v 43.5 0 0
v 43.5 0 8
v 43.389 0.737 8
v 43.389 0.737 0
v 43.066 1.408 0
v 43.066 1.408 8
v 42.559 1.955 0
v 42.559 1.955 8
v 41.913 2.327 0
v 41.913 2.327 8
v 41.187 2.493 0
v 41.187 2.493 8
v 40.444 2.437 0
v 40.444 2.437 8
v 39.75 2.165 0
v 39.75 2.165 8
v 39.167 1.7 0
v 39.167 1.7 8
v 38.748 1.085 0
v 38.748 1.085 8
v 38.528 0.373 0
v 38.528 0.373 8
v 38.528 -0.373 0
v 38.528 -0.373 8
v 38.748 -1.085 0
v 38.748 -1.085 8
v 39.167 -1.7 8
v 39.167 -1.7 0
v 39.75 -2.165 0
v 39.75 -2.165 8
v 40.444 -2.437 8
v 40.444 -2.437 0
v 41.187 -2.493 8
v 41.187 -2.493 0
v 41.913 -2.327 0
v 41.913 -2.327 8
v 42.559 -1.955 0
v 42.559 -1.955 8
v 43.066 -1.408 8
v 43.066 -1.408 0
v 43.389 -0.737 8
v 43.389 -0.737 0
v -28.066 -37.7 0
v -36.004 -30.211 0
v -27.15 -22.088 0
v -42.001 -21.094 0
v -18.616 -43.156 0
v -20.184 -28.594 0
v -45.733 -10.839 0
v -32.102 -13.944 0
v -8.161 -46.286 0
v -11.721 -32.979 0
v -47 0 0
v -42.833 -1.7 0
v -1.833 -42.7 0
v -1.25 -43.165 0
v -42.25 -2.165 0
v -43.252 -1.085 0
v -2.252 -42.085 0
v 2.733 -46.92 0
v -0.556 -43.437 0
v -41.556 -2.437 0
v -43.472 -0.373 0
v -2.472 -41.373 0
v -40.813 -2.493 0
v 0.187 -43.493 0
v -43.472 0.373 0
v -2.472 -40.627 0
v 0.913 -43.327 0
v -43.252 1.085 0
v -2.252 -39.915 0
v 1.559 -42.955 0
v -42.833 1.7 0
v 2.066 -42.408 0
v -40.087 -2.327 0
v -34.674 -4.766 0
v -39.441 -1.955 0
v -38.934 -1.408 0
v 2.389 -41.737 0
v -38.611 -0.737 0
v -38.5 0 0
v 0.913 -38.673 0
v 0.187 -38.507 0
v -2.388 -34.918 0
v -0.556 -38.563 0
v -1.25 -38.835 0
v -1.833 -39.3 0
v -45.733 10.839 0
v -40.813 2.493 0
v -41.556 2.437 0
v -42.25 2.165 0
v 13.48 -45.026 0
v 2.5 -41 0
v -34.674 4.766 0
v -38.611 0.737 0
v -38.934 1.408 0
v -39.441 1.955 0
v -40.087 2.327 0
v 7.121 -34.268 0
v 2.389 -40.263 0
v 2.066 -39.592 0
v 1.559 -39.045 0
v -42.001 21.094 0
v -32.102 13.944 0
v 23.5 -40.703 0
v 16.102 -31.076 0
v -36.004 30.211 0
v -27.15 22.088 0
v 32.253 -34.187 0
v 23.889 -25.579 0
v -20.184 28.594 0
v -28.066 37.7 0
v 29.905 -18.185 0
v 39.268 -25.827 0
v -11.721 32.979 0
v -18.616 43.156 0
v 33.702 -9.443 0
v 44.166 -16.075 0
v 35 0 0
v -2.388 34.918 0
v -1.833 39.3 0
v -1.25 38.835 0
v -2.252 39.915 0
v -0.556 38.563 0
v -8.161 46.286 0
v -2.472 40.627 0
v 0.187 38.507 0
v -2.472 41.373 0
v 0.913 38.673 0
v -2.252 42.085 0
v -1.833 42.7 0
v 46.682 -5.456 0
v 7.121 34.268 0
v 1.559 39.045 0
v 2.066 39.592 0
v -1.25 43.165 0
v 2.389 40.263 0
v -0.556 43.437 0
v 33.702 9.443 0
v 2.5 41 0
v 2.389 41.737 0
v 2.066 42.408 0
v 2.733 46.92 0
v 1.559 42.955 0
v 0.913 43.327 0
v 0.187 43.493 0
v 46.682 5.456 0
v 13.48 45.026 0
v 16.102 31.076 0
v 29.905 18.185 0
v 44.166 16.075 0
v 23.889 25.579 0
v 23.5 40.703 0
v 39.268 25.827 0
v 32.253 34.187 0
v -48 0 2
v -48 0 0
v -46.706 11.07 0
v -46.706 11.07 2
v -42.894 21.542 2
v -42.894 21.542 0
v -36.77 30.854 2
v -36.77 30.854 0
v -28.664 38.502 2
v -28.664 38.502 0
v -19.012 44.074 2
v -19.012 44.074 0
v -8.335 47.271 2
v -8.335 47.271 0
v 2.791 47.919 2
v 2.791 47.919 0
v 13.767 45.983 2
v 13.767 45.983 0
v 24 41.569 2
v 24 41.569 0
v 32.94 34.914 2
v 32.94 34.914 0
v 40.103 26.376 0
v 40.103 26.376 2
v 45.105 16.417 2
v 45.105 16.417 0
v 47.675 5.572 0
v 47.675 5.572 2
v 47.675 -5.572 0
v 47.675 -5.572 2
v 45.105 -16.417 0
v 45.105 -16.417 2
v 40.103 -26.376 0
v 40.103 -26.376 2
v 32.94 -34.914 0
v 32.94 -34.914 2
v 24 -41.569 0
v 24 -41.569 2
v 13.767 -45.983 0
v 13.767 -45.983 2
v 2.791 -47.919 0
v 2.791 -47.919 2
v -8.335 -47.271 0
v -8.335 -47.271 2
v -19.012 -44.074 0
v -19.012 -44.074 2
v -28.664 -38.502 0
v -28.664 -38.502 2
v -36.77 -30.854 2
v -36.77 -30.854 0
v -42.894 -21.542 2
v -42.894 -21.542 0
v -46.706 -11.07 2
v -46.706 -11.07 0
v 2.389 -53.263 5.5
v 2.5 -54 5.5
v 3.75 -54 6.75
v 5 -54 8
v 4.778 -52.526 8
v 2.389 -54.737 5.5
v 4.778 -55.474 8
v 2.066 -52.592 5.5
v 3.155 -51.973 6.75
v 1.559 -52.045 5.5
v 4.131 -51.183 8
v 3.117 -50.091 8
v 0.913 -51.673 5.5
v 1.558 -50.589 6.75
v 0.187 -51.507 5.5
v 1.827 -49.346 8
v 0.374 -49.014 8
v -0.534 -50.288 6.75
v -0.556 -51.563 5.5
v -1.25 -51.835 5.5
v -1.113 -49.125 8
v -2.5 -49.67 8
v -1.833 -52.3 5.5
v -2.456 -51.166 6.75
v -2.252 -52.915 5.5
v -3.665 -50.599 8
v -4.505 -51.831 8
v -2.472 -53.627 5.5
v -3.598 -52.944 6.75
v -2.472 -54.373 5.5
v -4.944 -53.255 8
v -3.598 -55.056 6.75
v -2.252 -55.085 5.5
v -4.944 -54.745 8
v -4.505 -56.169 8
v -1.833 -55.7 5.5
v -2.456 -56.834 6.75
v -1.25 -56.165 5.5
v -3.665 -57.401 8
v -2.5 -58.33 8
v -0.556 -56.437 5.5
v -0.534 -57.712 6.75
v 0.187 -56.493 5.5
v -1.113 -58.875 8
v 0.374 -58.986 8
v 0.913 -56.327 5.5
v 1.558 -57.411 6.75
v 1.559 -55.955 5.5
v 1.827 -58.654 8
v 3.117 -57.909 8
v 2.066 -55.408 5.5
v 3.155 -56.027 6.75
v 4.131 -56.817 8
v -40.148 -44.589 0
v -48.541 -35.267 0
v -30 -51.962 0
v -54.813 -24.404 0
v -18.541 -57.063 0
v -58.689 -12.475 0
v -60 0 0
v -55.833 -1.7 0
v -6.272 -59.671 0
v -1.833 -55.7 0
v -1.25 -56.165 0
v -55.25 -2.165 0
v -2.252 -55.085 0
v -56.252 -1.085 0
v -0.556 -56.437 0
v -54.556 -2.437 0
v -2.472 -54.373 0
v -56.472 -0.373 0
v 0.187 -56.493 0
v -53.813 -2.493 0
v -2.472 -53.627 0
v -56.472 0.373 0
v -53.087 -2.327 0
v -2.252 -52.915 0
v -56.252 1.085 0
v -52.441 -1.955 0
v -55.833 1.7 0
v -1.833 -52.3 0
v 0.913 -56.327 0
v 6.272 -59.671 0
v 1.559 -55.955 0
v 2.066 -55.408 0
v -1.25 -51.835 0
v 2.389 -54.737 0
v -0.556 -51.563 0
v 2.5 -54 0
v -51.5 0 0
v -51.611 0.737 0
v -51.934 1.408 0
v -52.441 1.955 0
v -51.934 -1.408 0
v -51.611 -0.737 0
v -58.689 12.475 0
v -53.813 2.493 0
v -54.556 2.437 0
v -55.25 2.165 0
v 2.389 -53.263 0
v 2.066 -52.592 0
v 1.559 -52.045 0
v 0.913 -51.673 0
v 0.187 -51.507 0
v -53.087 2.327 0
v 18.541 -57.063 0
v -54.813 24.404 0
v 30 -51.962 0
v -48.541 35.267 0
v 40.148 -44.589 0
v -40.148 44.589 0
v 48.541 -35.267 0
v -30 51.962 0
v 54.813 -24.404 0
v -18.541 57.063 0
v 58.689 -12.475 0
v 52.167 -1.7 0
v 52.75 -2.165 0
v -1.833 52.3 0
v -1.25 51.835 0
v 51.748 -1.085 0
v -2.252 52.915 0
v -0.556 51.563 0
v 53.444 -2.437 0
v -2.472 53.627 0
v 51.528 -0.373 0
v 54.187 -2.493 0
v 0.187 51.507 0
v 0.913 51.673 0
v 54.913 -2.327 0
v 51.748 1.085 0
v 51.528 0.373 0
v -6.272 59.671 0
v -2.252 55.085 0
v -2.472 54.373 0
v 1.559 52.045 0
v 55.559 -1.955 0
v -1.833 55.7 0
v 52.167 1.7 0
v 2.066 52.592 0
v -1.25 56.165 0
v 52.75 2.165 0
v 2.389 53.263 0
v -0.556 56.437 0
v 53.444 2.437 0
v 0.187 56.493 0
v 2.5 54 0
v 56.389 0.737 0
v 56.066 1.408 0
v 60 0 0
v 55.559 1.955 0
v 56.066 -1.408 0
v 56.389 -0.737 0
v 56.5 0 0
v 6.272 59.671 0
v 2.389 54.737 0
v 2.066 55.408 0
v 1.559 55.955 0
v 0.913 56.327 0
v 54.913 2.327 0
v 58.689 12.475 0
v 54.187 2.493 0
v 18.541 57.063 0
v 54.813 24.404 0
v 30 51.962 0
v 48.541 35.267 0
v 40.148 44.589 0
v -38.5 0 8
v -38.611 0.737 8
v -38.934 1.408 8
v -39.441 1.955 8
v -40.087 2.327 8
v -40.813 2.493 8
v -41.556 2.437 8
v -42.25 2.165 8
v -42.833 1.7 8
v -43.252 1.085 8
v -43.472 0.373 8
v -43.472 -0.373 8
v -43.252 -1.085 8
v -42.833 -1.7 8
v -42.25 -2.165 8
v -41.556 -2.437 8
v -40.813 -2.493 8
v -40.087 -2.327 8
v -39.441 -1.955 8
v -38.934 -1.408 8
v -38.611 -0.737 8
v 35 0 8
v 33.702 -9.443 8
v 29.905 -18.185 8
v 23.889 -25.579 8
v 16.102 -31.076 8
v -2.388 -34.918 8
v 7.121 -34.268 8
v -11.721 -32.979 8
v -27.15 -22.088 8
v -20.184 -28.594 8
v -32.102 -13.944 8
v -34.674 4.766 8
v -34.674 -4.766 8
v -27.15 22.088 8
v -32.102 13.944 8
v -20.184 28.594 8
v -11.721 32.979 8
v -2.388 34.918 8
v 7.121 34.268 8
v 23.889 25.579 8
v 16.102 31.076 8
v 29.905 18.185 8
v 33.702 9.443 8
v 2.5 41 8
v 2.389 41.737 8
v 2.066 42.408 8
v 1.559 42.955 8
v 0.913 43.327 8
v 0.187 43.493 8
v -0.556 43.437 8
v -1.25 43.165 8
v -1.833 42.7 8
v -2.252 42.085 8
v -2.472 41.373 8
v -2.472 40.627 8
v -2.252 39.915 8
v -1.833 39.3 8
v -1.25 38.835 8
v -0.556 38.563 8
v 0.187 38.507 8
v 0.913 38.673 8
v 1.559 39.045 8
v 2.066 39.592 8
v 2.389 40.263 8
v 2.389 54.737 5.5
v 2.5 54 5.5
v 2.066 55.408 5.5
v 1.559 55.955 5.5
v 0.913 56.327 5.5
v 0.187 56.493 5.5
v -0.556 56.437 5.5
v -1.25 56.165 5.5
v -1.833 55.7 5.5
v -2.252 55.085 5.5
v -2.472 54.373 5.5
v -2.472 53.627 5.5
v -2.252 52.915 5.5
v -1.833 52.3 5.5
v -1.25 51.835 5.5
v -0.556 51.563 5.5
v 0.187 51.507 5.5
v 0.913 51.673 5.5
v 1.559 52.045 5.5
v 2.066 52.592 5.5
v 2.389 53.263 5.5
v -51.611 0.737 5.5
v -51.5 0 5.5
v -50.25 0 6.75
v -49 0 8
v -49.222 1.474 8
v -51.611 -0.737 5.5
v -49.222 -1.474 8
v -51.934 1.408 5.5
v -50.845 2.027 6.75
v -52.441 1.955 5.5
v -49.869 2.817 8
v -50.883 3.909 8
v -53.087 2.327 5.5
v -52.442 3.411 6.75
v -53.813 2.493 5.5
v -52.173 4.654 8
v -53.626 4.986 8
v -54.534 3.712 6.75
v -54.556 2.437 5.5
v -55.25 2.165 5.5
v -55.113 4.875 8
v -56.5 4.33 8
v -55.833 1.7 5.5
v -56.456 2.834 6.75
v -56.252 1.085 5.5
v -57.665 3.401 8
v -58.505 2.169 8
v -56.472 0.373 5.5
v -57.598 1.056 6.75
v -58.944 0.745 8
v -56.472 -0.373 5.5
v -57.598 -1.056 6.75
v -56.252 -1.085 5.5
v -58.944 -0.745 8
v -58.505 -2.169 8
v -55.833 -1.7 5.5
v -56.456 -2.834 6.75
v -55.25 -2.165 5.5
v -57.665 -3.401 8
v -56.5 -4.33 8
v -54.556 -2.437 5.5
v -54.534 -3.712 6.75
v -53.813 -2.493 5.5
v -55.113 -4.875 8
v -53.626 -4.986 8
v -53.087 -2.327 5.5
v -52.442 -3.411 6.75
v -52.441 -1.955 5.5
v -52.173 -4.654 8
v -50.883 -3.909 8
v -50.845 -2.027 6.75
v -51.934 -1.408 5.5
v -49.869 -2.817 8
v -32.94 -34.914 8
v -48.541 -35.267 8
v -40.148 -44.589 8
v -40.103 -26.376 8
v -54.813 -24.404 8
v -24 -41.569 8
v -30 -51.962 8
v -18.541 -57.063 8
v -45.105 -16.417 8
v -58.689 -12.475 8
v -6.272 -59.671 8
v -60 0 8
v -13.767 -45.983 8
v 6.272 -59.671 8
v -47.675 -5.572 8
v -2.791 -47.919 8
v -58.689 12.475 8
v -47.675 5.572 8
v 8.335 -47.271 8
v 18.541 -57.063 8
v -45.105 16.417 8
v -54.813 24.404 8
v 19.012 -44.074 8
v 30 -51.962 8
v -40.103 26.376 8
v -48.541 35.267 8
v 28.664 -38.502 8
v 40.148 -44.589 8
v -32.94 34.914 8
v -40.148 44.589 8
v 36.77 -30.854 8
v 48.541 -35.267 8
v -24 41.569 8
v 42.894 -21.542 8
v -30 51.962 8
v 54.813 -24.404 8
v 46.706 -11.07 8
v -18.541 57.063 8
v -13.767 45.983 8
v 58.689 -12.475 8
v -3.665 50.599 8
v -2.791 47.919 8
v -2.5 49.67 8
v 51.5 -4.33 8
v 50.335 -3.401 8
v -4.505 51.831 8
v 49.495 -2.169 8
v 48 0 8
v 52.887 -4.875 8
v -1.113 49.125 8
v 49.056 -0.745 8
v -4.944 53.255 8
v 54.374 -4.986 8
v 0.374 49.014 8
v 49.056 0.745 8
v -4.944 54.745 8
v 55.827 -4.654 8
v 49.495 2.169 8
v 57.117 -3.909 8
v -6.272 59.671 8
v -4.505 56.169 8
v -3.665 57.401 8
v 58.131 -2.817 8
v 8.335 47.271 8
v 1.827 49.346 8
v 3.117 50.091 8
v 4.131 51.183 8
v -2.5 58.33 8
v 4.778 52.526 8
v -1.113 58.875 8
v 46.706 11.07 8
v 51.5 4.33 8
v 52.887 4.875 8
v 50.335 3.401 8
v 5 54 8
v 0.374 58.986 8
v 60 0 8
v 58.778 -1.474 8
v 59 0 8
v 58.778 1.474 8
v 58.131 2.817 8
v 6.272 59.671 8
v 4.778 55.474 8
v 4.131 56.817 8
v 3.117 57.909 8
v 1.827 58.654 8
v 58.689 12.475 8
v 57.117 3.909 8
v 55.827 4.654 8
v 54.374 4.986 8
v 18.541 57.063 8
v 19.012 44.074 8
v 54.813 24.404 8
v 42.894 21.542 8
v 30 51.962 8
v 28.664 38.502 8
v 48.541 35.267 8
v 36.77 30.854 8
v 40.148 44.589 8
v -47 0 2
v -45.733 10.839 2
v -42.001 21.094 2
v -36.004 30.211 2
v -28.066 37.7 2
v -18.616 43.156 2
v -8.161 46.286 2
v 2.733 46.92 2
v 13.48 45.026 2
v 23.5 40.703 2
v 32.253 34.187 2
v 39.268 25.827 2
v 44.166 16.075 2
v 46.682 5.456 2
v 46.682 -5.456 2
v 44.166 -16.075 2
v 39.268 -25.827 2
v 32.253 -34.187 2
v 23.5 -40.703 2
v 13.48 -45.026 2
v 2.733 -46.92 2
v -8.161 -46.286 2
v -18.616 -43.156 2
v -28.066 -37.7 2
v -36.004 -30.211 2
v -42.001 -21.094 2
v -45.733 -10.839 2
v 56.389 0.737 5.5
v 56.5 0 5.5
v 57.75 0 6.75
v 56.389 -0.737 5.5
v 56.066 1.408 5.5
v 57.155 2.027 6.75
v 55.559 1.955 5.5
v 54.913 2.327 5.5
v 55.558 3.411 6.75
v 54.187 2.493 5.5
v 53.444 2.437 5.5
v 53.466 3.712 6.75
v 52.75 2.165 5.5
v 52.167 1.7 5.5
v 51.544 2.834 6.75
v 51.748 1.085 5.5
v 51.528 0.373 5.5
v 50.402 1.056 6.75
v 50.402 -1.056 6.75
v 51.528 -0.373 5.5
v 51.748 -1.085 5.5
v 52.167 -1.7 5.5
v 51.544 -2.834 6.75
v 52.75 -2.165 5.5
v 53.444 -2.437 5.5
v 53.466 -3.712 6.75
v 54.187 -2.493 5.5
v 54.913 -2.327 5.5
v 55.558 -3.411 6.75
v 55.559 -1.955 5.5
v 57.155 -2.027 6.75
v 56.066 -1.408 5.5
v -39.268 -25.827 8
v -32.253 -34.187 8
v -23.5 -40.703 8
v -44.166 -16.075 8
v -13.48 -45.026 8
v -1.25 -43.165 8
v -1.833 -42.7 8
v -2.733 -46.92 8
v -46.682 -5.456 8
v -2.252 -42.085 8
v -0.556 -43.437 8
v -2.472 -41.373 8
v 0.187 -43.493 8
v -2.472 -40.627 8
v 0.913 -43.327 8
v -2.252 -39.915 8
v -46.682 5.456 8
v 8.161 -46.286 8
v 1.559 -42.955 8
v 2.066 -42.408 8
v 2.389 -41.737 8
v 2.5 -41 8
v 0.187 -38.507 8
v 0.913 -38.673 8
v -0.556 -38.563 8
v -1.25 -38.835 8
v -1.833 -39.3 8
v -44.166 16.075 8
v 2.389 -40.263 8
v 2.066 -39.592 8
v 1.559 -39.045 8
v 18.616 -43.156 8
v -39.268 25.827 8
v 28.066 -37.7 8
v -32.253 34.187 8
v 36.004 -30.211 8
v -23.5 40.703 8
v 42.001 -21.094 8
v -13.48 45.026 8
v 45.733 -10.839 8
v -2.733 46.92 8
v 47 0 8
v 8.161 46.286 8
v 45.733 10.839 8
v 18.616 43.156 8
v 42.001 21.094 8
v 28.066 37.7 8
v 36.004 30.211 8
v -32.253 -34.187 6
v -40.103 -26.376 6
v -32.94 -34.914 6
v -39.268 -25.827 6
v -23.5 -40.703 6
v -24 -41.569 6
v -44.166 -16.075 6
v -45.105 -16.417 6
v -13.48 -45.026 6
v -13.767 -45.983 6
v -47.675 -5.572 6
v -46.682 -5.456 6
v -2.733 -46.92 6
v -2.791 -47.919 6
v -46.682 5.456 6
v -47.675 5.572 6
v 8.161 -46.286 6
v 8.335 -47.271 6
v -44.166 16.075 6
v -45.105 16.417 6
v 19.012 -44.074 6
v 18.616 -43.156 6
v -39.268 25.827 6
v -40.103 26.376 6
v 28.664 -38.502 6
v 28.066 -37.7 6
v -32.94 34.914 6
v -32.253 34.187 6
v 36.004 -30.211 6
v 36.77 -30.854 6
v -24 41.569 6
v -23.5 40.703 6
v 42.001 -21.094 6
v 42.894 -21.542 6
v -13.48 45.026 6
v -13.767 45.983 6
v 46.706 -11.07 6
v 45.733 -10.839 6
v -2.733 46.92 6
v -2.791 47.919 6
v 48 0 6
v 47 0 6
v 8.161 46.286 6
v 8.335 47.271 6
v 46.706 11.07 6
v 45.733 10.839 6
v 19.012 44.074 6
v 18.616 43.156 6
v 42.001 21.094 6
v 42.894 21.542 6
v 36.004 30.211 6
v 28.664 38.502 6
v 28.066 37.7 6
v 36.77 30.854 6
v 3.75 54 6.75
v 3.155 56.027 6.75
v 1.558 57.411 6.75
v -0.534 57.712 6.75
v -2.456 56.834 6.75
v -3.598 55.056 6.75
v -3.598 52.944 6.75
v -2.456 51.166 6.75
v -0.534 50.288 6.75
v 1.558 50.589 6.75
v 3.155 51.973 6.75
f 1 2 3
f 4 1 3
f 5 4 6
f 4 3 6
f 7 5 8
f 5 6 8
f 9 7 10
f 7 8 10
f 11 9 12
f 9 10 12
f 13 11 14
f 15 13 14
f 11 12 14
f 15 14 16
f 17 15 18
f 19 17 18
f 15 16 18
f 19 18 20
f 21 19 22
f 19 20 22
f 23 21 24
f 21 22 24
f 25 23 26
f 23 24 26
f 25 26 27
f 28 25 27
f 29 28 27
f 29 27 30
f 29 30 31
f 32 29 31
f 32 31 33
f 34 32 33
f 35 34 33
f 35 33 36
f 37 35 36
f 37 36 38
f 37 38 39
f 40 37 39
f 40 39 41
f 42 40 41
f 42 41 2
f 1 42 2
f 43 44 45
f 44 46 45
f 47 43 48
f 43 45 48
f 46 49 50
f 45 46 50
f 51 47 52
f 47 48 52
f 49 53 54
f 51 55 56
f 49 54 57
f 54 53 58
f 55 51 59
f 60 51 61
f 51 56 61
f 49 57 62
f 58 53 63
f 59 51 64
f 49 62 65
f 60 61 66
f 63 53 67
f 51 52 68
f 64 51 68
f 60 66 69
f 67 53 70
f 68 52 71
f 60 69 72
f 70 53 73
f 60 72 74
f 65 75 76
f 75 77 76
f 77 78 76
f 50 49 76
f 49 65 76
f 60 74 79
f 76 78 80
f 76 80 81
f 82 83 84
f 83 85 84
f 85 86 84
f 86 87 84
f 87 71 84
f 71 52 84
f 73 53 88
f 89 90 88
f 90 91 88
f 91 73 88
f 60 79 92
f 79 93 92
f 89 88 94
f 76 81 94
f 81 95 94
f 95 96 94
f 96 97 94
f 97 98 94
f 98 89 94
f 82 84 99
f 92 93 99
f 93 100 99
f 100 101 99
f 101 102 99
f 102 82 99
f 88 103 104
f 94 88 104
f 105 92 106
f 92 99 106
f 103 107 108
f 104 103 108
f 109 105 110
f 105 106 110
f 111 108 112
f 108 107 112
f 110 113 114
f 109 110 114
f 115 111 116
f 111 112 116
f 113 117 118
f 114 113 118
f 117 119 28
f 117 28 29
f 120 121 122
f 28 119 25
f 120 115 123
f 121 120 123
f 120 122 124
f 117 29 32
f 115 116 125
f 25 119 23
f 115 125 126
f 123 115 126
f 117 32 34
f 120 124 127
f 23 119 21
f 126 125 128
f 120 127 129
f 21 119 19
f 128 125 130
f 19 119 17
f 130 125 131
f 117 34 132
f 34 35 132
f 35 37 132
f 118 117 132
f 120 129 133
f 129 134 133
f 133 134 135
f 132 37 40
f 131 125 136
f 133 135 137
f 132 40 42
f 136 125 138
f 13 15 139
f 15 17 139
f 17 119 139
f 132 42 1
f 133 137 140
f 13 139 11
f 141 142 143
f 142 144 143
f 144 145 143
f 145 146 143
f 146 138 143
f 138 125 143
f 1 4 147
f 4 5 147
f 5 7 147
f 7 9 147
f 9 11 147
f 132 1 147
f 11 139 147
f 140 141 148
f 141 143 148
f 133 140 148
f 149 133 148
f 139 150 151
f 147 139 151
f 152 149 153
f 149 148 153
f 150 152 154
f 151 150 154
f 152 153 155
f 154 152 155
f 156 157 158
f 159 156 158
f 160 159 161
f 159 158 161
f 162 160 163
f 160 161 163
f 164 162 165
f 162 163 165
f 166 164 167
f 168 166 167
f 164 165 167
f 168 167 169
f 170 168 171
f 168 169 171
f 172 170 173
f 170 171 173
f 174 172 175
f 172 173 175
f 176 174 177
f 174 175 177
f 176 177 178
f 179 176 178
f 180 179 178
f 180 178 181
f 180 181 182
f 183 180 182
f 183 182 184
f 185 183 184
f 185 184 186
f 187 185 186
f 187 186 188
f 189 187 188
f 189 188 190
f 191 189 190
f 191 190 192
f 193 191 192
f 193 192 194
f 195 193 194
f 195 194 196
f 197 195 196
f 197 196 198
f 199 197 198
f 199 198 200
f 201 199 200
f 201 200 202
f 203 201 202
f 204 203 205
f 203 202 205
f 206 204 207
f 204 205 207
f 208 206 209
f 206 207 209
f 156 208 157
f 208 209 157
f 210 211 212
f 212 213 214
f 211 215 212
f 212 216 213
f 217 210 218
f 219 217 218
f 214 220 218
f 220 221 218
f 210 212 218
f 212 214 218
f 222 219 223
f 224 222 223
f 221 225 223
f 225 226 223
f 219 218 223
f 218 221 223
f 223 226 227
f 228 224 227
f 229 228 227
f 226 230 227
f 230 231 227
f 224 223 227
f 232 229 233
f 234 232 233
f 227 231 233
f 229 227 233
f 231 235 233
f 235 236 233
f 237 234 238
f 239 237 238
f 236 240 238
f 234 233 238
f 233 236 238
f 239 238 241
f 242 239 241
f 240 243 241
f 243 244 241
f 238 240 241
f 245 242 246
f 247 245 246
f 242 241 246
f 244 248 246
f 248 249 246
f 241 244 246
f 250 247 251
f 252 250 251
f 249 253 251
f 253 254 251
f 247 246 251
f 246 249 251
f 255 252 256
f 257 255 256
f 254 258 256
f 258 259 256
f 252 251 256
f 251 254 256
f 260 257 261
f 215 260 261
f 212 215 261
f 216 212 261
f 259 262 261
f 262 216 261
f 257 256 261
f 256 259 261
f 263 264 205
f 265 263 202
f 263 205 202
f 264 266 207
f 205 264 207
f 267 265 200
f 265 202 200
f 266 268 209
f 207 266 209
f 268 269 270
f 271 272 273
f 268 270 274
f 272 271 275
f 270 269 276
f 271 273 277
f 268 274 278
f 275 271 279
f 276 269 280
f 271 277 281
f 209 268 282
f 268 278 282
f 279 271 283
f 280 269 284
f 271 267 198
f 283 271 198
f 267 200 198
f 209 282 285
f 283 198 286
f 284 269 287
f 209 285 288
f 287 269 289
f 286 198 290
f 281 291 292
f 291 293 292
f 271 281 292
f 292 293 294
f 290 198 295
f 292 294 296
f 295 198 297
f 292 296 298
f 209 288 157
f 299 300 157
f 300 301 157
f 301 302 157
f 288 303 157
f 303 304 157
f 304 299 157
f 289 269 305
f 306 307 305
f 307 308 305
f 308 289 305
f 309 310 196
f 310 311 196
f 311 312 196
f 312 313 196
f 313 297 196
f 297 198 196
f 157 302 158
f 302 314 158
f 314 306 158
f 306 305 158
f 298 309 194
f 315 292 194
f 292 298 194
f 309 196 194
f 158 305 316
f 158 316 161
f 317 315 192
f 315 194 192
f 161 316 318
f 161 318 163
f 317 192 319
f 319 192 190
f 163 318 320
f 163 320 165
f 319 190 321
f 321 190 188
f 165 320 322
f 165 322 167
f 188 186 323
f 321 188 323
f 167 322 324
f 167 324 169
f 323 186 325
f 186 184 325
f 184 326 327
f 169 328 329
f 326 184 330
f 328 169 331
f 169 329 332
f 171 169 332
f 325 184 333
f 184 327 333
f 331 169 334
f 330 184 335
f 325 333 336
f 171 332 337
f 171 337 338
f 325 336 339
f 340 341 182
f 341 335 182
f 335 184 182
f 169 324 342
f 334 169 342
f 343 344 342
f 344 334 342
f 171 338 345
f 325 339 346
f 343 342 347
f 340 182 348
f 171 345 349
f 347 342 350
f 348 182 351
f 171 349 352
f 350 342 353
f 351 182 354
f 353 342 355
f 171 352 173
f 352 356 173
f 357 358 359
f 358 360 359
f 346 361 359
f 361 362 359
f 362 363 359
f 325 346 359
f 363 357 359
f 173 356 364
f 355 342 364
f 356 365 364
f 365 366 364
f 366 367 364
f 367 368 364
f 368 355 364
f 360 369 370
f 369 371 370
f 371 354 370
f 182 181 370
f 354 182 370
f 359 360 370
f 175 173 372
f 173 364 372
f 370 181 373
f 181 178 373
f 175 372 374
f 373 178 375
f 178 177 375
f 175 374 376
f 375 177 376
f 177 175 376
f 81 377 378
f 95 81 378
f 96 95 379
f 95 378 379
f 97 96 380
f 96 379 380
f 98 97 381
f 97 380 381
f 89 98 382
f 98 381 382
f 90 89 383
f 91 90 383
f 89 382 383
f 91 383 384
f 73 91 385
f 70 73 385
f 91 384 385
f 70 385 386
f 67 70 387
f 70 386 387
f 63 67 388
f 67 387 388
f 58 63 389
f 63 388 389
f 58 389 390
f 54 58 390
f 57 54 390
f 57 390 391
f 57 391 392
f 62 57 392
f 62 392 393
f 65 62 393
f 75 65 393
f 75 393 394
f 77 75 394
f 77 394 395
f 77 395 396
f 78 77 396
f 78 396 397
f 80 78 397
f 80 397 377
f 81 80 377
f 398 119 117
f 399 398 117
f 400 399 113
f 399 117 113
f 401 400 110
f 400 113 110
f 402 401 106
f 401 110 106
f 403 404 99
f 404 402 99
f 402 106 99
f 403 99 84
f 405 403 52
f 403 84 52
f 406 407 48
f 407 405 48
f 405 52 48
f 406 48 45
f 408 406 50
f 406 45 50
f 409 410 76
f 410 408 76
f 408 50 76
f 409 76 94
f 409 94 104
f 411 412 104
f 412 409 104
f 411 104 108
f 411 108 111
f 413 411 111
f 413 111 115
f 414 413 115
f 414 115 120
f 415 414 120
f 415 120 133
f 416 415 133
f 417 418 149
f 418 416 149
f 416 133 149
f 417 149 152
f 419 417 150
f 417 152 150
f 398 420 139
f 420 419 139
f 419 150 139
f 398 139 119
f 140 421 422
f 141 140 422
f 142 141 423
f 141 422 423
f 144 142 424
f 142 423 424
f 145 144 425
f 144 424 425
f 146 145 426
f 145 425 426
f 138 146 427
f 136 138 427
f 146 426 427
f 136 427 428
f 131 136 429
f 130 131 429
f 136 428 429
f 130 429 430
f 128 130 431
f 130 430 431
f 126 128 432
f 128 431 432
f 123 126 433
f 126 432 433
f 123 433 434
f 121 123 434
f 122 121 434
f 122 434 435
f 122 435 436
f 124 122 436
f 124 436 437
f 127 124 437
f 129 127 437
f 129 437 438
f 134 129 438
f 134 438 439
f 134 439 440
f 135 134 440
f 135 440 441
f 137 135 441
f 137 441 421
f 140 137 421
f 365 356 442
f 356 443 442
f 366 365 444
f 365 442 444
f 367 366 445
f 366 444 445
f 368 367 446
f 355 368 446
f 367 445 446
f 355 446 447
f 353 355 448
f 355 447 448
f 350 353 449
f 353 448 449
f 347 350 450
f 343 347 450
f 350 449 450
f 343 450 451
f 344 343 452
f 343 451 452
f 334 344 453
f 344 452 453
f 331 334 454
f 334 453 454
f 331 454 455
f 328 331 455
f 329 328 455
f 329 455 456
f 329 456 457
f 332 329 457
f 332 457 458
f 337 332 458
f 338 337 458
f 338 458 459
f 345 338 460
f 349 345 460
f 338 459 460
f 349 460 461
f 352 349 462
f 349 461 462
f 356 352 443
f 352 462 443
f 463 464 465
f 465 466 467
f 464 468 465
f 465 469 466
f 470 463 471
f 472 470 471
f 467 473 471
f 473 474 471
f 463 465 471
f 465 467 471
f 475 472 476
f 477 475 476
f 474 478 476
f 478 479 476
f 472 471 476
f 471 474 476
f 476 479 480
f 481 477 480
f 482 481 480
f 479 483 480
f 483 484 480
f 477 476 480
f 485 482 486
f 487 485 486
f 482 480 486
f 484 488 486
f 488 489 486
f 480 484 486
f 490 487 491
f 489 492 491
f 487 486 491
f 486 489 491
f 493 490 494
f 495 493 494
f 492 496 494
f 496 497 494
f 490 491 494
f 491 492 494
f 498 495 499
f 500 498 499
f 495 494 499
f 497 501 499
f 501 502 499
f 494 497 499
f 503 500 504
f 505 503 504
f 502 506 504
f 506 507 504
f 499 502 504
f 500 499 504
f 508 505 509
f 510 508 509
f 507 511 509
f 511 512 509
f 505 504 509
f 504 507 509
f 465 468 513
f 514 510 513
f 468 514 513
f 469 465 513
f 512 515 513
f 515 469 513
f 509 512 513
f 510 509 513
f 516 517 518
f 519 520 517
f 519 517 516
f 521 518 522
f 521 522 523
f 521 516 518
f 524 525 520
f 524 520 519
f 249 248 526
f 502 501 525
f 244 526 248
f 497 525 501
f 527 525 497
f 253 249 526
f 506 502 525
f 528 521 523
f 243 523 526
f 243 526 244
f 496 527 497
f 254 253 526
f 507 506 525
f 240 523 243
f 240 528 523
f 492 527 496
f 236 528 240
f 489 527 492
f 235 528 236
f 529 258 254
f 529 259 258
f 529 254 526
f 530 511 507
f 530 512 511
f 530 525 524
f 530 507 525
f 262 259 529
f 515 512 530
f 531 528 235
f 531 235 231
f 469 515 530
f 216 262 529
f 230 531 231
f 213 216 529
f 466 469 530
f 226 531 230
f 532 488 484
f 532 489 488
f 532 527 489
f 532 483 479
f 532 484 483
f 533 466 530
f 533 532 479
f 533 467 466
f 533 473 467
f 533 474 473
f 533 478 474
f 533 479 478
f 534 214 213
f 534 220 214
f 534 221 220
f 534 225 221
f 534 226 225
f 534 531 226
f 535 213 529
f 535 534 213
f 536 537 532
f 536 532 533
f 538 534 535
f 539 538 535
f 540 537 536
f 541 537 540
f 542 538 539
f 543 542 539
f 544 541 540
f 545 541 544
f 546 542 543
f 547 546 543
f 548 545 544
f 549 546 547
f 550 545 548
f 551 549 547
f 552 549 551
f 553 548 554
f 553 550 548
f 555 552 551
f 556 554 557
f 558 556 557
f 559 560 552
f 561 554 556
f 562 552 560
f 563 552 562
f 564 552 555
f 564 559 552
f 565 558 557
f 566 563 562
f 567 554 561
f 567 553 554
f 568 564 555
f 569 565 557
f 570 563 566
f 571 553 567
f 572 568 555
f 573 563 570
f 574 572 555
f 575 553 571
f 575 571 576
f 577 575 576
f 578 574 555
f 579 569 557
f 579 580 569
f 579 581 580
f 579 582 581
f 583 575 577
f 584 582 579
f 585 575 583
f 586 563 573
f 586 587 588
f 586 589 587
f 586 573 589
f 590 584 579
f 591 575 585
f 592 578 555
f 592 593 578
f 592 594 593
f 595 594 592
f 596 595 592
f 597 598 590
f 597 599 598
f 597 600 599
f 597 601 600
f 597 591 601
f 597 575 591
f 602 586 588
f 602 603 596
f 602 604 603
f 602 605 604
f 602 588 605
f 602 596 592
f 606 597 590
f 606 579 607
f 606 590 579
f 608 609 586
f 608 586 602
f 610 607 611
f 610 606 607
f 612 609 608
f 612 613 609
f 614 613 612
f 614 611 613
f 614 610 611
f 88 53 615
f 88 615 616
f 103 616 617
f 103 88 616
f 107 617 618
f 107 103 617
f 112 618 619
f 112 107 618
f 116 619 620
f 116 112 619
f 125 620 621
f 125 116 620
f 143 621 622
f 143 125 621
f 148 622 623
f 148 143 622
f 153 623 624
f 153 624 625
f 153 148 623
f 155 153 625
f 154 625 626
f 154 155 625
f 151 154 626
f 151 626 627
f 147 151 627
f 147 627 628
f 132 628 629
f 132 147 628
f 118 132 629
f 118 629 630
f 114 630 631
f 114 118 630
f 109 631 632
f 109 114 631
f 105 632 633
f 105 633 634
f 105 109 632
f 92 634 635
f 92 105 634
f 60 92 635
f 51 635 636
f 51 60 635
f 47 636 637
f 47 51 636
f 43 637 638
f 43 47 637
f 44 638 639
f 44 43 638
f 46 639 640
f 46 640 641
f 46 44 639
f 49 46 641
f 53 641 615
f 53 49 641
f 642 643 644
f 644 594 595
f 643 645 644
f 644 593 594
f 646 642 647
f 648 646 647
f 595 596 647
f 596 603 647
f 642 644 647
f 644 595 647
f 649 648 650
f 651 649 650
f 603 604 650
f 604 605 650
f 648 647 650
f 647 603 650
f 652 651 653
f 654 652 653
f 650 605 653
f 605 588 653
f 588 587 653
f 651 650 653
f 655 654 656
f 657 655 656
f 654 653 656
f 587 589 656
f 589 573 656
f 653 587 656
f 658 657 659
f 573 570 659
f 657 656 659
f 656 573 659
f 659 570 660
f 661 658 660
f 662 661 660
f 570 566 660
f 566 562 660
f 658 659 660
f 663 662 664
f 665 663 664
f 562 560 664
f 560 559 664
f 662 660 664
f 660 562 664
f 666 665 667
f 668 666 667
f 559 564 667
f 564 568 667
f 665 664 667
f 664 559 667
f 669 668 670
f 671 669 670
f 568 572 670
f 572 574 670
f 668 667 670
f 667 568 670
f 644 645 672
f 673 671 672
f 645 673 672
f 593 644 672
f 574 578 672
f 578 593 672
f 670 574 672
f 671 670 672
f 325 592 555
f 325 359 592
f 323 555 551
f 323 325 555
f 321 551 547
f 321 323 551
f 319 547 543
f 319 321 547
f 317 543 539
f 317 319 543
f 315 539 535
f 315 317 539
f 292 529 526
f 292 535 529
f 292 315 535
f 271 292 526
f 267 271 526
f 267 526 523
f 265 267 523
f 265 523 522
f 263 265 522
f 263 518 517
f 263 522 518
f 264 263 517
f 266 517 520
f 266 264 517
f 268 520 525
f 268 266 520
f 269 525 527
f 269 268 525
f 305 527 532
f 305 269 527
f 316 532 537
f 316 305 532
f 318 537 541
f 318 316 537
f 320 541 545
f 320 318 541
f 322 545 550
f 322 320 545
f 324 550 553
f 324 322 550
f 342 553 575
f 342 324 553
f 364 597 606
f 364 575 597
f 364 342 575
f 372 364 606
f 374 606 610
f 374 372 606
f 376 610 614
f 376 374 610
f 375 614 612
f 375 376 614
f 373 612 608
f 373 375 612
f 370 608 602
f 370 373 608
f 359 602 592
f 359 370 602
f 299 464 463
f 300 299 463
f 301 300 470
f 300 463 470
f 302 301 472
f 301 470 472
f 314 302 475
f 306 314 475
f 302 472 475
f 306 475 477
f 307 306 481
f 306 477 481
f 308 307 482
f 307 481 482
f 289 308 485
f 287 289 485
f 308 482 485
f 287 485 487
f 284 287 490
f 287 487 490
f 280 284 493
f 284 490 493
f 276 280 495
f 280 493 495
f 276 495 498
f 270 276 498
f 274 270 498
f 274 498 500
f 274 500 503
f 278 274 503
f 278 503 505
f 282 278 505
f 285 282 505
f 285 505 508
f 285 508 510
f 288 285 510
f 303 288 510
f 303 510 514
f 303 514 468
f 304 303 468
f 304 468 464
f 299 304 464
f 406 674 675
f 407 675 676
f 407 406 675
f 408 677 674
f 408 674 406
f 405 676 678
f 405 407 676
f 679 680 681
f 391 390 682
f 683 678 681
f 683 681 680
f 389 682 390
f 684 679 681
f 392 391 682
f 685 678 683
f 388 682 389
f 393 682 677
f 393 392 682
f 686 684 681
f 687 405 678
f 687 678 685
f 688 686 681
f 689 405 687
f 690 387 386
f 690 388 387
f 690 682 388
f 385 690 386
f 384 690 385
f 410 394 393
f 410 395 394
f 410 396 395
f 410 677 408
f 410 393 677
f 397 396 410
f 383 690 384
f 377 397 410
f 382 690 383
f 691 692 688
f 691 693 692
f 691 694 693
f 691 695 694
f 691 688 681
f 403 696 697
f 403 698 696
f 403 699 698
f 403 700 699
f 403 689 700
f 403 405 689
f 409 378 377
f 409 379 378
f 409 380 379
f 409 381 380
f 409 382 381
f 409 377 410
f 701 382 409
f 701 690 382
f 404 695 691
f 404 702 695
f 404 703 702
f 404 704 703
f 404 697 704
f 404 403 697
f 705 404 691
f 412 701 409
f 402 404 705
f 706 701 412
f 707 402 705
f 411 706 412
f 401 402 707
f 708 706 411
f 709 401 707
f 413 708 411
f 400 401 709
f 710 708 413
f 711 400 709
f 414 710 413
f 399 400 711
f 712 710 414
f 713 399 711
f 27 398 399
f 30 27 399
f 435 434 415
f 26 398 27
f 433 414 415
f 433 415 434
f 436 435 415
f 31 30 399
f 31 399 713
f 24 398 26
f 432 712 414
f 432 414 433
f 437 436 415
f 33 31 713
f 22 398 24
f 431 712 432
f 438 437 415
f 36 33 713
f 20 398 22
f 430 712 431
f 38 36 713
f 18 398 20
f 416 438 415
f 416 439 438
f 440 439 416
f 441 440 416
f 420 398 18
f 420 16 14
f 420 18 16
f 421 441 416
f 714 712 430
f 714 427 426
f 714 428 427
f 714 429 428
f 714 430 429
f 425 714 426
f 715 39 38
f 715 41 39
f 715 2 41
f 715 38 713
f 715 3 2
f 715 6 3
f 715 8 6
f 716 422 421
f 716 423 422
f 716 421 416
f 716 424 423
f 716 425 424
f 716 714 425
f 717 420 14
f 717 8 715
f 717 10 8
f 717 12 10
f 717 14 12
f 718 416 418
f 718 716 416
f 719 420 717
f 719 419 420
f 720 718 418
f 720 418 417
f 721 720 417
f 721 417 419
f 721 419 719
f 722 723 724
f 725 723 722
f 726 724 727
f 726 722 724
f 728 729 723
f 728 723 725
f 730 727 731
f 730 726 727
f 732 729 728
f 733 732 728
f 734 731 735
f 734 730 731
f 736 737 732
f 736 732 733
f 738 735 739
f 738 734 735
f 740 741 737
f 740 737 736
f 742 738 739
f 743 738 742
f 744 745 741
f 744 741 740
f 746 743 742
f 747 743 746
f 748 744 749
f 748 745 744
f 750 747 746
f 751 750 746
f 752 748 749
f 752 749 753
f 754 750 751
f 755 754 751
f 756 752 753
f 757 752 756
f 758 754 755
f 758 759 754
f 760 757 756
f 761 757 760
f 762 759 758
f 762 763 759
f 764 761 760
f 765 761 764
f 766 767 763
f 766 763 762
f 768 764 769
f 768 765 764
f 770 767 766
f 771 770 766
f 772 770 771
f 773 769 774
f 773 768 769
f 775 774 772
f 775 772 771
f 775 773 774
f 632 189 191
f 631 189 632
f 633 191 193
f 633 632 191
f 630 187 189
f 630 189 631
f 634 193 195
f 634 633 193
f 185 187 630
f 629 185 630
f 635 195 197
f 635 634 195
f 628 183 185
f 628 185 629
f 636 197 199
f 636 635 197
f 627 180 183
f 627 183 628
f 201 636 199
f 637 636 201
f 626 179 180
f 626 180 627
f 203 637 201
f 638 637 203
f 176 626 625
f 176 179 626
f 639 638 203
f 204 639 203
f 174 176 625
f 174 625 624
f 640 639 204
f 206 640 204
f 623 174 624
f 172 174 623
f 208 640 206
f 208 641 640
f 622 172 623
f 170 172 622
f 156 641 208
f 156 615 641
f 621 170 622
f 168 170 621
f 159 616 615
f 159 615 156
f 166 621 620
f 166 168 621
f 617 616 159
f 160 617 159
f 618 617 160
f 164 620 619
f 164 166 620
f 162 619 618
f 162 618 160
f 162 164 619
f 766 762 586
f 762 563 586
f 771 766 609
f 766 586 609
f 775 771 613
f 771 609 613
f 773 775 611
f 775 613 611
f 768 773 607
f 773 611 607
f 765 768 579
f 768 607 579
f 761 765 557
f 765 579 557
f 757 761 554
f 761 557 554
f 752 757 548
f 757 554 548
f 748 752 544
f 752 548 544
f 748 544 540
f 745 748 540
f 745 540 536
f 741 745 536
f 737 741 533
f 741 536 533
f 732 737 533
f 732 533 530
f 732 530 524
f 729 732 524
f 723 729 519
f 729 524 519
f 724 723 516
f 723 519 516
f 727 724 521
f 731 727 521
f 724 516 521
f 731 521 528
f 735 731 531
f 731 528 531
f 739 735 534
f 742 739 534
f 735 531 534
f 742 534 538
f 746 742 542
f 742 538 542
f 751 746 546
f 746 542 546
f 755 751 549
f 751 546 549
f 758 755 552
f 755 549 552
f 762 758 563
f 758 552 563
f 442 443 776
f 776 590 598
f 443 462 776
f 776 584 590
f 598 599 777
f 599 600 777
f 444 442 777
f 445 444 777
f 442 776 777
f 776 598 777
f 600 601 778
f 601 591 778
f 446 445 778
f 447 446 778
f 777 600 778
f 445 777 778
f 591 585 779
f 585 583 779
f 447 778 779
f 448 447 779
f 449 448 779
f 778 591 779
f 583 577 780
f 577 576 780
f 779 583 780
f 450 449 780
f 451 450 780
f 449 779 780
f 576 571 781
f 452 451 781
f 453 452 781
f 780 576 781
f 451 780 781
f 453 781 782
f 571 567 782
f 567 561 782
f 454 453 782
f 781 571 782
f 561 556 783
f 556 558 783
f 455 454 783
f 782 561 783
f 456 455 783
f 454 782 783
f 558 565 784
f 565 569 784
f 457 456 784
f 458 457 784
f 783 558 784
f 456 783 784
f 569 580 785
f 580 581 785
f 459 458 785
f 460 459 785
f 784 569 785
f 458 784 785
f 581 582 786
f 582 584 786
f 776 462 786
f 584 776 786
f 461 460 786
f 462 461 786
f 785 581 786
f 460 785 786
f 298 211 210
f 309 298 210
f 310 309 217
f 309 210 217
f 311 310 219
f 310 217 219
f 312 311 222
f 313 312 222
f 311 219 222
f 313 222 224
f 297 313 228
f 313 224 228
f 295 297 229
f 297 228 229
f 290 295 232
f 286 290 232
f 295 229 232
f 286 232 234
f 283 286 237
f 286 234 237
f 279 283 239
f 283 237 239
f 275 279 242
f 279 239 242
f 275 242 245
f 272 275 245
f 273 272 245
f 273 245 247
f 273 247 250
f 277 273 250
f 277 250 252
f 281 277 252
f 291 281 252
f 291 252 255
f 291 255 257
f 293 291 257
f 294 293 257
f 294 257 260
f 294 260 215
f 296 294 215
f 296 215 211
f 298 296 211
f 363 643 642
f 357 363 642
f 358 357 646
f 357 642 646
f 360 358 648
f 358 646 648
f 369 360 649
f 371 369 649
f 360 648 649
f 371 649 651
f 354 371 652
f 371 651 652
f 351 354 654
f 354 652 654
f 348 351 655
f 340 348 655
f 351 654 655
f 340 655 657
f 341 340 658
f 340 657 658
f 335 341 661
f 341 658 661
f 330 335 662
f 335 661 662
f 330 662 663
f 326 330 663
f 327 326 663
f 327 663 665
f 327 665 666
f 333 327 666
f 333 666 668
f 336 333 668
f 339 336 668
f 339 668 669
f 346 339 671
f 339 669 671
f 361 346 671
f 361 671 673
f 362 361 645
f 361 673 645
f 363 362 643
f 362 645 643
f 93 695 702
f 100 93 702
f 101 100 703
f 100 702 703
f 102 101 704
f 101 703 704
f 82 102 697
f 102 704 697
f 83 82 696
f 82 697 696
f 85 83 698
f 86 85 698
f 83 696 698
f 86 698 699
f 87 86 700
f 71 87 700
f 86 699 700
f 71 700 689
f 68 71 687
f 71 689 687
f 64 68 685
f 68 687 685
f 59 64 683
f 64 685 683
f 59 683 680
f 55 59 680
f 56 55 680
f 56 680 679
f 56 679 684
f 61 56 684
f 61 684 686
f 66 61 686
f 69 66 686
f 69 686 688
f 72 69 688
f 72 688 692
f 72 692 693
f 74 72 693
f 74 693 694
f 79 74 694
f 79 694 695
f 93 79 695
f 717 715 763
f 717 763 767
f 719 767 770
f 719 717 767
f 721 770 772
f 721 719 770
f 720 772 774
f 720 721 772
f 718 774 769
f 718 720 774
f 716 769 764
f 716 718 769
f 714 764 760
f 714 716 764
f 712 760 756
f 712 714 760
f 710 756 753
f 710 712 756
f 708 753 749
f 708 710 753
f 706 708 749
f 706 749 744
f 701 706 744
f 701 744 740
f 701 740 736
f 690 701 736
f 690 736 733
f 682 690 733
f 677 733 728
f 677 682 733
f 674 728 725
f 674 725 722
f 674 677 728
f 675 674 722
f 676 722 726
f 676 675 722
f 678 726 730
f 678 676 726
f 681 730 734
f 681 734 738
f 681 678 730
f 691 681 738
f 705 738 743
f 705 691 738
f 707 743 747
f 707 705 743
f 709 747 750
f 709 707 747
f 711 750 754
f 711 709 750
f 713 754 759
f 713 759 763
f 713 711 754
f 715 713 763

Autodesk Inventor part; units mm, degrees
ref_plane "YZ Plane" through (0, 0, 0) normal (1, 0, 0) x (0, 1, 0)
ref_plane "XZ Plane" through (0, 0, 0) normal (0, 1, 0) x (-1, 0, 0)
ref_plane "XY Plane" through (0, 0, 0) normal (0, 0, 1) x (1, 0, 0)
sketch "草圖1" plane through (0, 0, 0) normal (0, 0, 1) x (1, 0, 0)
  circle A0 centre (0, 0) radius 60
  circle A1 centre (0, 0) radius 35
  dimension "d0" = 120
  dimension "d4" = 70
extrude "擠出1" add sketch "草圖1" along normal blind 8
sketch "草圖2" plane through (0, 0, 8) normal (0, 0, 1) x (1, 0, 0)
  circle A0 centre (0, 0) radius 60 projected
  circle A1 centre (0, 0) radius 35 projected
  circle A2 centre (0, 0) radius 48
  circle A3 centre (0, 0) radius 47
  dimension "d7" = 12
  dimension "d8" = 12
extrude "擠出2" cut sketch "草圖2" against normal blind 2 contours A2
sketch "草圖3" plane through (0, 0, 0) normal (0, 0, -1) x (-1, 0, 0)
  circle A0 centre (0, 0) radius 48 projected
  circle A1 centre (0, 0) radius 47 projected
  circle A2 centre (0, 0) radius 35 projected
  circle A3 centre (0, 0) radius 60 projected
extrude "擠出3" cut sketch "草圖3" against normal blind 2 contours A0
sketch "草圖4" plane through (0, 0, 8) normal (0, 0, 1) x (1, 0, 0)
  circle A0 centre (0, 0) radius 41 construction
  circle A1 centre (0, -41) radius 2.5
  circle A2 centre (0, 0) radius 41 construction
  circle A3 centre (41, 0) radius 2.5
  circle A4 centre (0, 0) radius 41 construction
  circle A5 centre (0, 41) radius 2.5
  circle A6 centre (0, 0) radius 41 construction
  circle A7 centre (-41, 0) radius 2.5
  circle A8 centre (0, 0) radius 54 construction
  circle A9 centre (0, -54) radius 2.5
  circle A10 centre (54, 0) radius 2.5
  circle A11 centre (0, 54) radius 2.5
  circle A12 centre (-54, 0) radius 2.5
  dimension "d13" = 82
  dimension "d19" = 108
  dimension "d14" = 5
  dimension "d17" = 360
  dimension "d20" = 5
  dimension "d23" = 360
extrude "擠出4" cut sketch "草圖4" against normal through all
chamfer "倒角1" distance 2.5 angle 45 4 edges at (51.5, 0, 8) (-2.5, -54, 8) (-56.5, 0, 8) (-2.5, 54, 8)
properties part number "arm bearing"
